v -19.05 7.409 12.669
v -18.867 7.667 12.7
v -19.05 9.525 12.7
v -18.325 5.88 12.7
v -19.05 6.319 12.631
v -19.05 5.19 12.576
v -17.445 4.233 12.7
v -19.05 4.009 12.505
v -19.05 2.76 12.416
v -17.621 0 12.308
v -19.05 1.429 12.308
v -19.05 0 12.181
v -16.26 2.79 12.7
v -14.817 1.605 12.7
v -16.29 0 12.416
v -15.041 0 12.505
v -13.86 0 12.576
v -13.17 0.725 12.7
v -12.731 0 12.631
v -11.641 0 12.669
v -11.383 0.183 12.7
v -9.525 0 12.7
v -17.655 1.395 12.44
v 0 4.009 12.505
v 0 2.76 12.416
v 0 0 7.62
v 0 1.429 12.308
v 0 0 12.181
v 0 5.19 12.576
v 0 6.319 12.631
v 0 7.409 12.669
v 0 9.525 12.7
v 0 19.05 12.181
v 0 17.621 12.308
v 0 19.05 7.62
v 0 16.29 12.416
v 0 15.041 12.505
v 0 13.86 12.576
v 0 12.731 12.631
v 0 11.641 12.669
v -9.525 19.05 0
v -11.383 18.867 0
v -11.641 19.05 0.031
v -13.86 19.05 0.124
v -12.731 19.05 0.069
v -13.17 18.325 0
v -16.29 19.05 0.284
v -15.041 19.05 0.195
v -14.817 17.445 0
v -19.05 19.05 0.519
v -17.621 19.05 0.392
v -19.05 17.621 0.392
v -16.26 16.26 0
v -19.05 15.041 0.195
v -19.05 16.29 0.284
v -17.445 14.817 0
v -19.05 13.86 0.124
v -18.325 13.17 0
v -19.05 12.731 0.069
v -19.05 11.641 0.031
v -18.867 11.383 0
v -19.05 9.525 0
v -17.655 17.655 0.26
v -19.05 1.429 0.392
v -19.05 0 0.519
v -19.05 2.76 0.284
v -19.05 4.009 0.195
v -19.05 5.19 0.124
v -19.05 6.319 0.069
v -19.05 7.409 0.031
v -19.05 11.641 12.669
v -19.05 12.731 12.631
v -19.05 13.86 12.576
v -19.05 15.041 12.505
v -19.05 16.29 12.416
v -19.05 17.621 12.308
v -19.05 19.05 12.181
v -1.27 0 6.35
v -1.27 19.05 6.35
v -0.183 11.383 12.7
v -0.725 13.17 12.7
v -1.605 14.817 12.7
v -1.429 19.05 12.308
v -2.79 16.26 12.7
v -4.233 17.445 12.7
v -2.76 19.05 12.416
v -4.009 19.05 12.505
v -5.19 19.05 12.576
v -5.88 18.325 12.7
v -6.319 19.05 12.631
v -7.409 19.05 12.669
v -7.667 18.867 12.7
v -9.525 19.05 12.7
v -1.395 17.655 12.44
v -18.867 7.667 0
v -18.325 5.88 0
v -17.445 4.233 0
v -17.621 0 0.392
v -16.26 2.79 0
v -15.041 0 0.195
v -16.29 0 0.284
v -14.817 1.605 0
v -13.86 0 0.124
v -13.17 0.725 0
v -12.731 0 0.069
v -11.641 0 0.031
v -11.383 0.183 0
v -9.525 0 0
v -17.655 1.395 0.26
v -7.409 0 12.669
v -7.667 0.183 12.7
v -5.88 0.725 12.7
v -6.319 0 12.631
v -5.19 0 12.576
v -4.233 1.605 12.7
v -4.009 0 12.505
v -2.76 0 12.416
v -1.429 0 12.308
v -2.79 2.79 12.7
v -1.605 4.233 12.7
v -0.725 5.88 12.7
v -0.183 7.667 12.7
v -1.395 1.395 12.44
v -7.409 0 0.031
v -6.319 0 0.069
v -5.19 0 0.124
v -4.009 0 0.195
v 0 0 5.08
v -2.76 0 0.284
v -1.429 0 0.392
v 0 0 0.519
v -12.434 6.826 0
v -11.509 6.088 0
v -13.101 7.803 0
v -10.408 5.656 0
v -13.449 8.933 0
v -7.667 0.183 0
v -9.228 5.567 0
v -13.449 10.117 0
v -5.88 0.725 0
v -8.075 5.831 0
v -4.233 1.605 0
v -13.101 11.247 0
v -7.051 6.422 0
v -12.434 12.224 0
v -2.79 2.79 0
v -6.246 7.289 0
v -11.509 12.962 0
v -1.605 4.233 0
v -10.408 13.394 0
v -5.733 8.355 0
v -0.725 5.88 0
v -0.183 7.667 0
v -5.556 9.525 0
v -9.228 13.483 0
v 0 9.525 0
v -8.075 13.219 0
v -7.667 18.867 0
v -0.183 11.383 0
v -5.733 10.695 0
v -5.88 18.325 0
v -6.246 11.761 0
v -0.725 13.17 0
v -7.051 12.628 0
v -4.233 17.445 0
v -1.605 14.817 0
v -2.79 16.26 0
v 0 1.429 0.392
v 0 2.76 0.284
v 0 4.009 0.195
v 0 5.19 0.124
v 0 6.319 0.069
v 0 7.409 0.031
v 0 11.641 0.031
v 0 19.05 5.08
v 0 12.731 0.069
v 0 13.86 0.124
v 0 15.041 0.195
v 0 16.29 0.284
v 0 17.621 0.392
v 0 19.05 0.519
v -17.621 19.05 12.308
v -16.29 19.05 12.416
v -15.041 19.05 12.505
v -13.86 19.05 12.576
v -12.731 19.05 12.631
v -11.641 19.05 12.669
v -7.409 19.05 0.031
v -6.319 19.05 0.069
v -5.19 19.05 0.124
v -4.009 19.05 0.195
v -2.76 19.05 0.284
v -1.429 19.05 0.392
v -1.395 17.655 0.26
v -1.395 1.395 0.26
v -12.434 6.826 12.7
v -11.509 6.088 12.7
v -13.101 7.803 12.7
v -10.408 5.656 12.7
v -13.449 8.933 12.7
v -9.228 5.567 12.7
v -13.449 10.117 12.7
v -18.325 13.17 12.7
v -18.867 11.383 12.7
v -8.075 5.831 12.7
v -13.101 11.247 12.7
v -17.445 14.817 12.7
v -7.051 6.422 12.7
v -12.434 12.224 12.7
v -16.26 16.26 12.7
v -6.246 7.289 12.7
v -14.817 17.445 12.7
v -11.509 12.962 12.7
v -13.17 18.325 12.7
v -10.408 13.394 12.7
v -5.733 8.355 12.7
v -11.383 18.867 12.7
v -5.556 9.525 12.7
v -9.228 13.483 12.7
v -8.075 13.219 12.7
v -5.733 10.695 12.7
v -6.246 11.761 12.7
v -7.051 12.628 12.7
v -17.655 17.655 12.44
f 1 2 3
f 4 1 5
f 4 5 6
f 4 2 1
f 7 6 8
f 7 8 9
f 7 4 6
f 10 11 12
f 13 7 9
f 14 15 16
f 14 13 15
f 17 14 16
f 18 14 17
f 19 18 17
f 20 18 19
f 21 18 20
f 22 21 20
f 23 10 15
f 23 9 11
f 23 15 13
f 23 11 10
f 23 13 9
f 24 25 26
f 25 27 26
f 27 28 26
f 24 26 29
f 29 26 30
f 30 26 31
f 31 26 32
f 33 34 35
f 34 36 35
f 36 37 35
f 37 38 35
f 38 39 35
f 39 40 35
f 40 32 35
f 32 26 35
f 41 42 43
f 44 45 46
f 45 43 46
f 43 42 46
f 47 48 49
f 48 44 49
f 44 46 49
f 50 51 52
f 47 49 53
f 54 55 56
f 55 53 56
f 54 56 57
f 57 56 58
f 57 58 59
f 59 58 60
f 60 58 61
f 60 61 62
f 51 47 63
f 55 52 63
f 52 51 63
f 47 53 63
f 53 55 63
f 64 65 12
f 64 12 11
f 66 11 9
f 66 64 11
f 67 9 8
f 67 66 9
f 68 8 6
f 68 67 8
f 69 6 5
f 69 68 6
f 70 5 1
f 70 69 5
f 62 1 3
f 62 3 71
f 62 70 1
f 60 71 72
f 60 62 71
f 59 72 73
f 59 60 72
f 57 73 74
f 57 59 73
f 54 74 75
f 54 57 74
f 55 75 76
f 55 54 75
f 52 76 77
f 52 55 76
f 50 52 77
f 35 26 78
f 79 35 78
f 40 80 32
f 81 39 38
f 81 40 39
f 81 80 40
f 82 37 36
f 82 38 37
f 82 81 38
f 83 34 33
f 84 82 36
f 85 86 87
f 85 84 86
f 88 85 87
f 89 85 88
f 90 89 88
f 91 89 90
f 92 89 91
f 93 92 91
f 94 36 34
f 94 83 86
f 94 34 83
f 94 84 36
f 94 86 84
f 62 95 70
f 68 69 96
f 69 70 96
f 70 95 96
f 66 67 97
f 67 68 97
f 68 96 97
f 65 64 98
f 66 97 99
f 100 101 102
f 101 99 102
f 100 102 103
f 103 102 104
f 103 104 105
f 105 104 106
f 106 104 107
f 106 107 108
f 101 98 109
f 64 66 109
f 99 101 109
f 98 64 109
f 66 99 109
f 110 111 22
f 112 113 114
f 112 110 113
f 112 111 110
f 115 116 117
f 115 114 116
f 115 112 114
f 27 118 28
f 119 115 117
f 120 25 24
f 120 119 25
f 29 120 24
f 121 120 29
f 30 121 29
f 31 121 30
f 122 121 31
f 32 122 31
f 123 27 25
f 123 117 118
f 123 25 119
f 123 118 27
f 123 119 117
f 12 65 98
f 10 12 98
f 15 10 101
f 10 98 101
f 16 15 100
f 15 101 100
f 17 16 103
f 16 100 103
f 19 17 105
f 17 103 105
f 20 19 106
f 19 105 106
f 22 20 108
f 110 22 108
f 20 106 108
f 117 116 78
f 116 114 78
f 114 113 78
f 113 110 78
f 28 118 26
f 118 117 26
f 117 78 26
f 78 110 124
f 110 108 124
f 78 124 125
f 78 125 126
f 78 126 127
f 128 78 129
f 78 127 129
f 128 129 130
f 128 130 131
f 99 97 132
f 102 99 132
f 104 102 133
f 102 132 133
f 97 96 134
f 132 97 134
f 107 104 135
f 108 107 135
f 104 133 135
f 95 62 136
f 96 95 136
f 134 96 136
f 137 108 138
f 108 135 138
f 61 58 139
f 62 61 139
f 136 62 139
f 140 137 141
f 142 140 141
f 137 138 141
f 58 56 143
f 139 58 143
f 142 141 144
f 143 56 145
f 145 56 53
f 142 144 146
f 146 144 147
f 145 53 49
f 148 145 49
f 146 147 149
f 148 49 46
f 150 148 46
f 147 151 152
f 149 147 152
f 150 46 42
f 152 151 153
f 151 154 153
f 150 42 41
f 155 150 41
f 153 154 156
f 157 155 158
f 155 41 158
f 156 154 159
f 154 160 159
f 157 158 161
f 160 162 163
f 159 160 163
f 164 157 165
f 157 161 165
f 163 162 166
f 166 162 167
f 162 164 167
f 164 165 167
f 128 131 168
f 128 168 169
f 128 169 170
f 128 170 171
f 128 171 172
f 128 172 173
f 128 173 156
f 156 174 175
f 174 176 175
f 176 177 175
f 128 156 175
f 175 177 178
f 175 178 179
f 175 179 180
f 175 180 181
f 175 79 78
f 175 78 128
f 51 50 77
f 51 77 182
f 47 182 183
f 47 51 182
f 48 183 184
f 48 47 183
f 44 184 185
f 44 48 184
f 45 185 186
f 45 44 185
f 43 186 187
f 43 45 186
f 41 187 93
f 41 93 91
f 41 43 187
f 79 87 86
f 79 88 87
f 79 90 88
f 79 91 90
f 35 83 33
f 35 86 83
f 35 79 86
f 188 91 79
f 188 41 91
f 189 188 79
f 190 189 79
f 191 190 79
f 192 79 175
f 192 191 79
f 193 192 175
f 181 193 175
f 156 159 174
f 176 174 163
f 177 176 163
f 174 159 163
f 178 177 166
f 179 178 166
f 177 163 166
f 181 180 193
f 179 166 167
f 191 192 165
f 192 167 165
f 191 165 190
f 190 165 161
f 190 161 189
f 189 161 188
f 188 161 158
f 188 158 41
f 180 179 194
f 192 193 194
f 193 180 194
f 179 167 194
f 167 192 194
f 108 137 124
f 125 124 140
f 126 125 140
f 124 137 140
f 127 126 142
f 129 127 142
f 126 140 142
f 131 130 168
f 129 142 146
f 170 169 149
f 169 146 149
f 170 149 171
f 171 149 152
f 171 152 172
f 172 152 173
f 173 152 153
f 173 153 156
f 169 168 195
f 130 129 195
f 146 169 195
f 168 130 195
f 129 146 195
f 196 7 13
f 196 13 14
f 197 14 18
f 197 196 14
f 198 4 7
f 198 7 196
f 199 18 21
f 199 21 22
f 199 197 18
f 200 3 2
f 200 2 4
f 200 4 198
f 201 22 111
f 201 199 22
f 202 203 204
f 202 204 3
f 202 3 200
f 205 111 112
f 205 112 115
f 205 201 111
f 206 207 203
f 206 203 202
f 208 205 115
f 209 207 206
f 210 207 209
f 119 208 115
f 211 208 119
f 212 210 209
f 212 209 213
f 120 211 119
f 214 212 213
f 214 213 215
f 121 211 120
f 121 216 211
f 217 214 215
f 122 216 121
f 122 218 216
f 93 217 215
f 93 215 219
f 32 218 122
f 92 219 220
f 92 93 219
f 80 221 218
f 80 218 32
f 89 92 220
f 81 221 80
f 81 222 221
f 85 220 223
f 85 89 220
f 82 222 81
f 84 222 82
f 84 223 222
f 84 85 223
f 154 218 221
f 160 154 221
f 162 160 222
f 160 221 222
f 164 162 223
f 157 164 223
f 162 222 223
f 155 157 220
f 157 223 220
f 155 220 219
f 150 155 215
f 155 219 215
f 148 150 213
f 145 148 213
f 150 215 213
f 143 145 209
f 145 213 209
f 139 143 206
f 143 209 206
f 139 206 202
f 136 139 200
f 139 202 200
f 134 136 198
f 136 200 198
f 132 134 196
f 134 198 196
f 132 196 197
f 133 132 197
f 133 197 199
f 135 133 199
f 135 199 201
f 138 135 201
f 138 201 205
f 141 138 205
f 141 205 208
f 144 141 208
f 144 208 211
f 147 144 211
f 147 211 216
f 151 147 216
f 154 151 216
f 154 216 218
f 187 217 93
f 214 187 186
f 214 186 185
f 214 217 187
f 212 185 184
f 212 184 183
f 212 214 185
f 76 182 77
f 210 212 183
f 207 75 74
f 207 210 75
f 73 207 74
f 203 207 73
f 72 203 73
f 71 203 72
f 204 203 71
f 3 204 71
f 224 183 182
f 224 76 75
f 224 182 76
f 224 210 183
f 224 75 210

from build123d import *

# Parameters (mm, degrees)
F0_W      = 19.05
F0_H      = 19.05
F1_DEPTH  = 12.7
F2_R      = 3.96875
F3_DEPTH  = 12.701
F12_DEPTH = 19.05


with BuildPart() as f1:
    # F0 (on Top) → F1 (new body)
    with BuildSketch(Plane.XY):
        with Locations((-9.525, 9.525)):
            Rectangle(F0_W, F0_H)
    extrude(amount=F1_DEPTH)

    # F2 (on face) → F3 (cut, through all)
    with BuildSketch(Plane.XY.offset(12.7)):
        with Locations((-9.525, 9.525)):
            Circle(F2_R)
    extrude(amount=-F3_DEPTH, mode=Mode.SUBTRACT)

    # F7: sweep along a path in F4
    with BuildLine(Plane.XY.offset(12.7)) as f7_path:
        CenterArc((-9.525, 9.525), 9.525, 0, 360)
    # F6 (on mid) → F7 (sweep, cut)
    with BuildSketch(Plane.XZ.offset(-9.525)):
        Polygon((-24.6209054321, 11.966576386), (-19.05, 12.7), (-24.6209054321, 13.433423614), align=None)
    sweep(path=f7_path.line, mode=Mode.SUBTRACT)

    # F9 (on mid) → F10 (revolve, cut)
    with BuildSketch(Plane.XZ.offset(-9.525)):
        Polygon((8.2884986839, 0), (0, 0), (8.2884986839, -1.091201553), align=None)
        Polygon((8.2884986839, 1.091201553), (0, 0), (8.2884986839, 0), align=None)
    revolve(axis=Axis((-9.525, 9.525, 12.7), (0, 0, 1)), mode=Mode.SUBTRACT)

    # F11 (on face) → F12 (cut)
    with BuildSketch(Plane.XZ):
        Polygon((0, 7.62), (-1.27, 6.35), (0, 5.08), align=None)
    extrude(amount=-F12_DEPTH, mode=Mode.SUBTRACT)


solid = f1.part
